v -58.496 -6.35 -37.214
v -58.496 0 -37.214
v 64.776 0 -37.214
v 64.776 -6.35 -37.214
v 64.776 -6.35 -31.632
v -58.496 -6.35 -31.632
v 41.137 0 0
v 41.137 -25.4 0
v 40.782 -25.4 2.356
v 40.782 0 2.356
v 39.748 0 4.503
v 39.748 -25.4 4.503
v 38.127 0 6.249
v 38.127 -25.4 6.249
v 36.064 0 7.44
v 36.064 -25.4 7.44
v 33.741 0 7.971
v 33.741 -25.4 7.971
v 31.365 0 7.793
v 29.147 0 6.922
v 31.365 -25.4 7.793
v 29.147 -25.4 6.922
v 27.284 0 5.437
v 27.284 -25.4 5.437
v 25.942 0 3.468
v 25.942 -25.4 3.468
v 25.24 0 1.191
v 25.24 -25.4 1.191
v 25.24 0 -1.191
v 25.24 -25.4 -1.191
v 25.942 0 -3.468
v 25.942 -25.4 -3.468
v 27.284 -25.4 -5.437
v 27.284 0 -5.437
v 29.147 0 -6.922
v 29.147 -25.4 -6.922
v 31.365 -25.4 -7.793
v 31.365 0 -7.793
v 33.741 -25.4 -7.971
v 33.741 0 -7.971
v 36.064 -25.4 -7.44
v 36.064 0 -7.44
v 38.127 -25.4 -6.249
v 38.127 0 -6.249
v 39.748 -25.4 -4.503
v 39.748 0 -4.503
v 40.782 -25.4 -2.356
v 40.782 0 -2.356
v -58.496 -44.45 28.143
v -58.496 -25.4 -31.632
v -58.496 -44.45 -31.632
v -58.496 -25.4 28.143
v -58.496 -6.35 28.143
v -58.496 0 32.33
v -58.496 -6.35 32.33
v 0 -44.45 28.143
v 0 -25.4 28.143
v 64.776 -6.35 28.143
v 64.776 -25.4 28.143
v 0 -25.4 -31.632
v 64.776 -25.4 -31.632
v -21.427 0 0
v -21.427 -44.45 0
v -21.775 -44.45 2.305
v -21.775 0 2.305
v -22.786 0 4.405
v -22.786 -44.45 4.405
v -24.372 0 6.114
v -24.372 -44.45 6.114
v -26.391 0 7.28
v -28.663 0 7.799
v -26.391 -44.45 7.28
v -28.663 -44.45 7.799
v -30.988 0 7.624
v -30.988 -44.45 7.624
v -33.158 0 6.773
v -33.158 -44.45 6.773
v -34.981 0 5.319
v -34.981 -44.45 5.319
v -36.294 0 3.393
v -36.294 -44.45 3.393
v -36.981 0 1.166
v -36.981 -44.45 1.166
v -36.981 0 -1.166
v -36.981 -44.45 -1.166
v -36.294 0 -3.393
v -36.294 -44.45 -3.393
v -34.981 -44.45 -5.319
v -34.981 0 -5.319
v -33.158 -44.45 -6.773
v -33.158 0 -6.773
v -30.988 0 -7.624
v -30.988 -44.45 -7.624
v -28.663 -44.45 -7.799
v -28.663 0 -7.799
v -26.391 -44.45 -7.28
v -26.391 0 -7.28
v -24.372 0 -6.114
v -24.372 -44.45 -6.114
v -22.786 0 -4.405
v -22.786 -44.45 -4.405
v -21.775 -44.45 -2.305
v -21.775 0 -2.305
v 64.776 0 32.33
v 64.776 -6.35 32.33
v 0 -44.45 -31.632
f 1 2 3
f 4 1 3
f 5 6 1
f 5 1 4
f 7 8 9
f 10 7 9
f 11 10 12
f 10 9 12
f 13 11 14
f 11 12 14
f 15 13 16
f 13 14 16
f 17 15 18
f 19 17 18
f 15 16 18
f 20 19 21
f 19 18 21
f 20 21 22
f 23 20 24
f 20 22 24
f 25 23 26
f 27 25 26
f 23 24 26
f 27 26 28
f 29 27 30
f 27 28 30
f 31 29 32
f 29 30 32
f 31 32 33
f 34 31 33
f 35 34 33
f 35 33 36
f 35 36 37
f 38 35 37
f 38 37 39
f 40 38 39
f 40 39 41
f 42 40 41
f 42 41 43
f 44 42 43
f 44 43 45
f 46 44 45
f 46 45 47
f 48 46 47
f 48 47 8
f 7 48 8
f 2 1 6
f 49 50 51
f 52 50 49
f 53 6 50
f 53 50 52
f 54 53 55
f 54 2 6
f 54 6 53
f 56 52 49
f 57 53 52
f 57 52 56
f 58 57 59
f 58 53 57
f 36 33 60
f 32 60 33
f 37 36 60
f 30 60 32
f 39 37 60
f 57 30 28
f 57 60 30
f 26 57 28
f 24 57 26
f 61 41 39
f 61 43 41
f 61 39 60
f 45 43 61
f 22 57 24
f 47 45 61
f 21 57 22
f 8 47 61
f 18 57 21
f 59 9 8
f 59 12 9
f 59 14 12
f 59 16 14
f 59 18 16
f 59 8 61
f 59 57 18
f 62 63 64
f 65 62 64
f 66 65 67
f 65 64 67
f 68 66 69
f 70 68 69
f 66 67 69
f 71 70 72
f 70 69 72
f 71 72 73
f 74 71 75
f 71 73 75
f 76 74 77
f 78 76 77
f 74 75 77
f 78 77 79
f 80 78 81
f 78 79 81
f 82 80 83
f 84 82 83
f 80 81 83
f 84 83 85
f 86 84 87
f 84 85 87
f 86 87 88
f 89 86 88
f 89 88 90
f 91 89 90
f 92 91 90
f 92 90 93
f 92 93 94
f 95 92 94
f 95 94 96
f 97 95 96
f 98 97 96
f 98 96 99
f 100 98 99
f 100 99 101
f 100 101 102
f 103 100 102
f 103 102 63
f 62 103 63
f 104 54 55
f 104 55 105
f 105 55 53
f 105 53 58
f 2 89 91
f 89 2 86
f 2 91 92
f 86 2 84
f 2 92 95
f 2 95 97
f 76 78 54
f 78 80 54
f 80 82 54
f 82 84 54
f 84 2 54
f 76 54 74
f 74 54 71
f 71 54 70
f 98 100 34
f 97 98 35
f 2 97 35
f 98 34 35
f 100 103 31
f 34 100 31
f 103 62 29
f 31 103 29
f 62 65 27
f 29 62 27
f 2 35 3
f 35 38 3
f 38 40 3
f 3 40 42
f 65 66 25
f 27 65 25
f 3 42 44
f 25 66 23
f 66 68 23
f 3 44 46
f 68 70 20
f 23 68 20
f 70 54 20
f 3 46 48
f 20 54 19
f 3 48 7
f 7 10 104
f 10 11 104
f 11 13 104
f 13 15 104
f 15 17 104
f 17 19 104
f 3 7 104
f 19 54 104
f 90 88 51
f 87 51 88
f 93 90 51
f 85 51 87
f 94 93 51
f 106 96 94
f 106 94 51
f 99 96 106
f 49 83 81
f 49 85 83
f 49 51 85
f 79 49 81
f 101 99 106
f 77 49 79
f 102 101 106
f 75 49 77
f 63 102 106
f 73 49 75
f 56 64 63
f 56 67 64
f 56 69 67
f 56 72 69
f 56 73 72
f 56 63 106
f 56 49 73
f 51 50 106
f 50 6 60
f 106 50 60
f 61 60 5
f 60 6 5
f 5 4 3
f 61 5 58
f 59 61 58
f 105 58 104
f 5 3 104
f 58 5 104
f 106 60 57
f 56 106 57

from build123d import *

# Parameters (mm, degrees)
F0_W     = 123.2712268829
F0_H     = 69.5435777307
F1_DEPTH = 25.4
F2_W     = 123.2712268829
F2_H     = 4.1865706444
F2_H_2   = 5.5820941925
F3_DEPTH = 19.05
F4_W     = 58.4956854582
F4_H     = 59.7749128938
F5_DEPTH = 19.05
F6_R     = 7.8204757045
F7_DEPTH = 84.836
F8_R     = 7.993016925
F9_DEPTH = 31.242


with BuildPart() as f1:
    # F0 (on Front) → F1 (new body)
    with BuildSketch(Plane.XZ):
        with Locations((3.1399279833, -2.4421662092)):
            Rectangle(F0_W, F0_H)
    extrude(amount=F1_DEPTH)

    # F2 (on face) → F3 (cut)
    with BuildSketch(Plane.XZ.offset(25.4)):
        with Locations((3.1399279833, 30.2363373339)):
            Rectangle(F2_W, F2_H)
        with Locations((3.1399279833, -34.4229079783)):
            Rectangle(F2_W, F2_H_2)
    extrude(amount=-F3_DEPTH, mode=Mode.SUBTRACT)

    # F4 (on face) → F5 (join)
    with BuildSketch(Plane.XZ.offset(25.4)):
        with Locations((-29.2478427291, -1.7444044352)):
            Rectangle(F4_W, F4_H)
    extrude(amount=F5_DEPTH)

    # F6 (on face) → F7 (cut)
    with BuildSketch(Plane.XZ.offset(44.45)):
        with Locations((-29.2478427291, 0)):
            Circle(F6_R)
    extrude(amount=-F7_DEPTH, mode=Mode.SUBTRACT)

    # F8 (on face) → F9 (cut)
    with BuildSketch(Plane.XZ.offset(25.4)):
        with Locations((33.1436805427, 0)):
            Circle(F8_R)
    extrude(amount=-F9_DEPTH, mode=Mode.SUBTRACT)


solid = f1.part
